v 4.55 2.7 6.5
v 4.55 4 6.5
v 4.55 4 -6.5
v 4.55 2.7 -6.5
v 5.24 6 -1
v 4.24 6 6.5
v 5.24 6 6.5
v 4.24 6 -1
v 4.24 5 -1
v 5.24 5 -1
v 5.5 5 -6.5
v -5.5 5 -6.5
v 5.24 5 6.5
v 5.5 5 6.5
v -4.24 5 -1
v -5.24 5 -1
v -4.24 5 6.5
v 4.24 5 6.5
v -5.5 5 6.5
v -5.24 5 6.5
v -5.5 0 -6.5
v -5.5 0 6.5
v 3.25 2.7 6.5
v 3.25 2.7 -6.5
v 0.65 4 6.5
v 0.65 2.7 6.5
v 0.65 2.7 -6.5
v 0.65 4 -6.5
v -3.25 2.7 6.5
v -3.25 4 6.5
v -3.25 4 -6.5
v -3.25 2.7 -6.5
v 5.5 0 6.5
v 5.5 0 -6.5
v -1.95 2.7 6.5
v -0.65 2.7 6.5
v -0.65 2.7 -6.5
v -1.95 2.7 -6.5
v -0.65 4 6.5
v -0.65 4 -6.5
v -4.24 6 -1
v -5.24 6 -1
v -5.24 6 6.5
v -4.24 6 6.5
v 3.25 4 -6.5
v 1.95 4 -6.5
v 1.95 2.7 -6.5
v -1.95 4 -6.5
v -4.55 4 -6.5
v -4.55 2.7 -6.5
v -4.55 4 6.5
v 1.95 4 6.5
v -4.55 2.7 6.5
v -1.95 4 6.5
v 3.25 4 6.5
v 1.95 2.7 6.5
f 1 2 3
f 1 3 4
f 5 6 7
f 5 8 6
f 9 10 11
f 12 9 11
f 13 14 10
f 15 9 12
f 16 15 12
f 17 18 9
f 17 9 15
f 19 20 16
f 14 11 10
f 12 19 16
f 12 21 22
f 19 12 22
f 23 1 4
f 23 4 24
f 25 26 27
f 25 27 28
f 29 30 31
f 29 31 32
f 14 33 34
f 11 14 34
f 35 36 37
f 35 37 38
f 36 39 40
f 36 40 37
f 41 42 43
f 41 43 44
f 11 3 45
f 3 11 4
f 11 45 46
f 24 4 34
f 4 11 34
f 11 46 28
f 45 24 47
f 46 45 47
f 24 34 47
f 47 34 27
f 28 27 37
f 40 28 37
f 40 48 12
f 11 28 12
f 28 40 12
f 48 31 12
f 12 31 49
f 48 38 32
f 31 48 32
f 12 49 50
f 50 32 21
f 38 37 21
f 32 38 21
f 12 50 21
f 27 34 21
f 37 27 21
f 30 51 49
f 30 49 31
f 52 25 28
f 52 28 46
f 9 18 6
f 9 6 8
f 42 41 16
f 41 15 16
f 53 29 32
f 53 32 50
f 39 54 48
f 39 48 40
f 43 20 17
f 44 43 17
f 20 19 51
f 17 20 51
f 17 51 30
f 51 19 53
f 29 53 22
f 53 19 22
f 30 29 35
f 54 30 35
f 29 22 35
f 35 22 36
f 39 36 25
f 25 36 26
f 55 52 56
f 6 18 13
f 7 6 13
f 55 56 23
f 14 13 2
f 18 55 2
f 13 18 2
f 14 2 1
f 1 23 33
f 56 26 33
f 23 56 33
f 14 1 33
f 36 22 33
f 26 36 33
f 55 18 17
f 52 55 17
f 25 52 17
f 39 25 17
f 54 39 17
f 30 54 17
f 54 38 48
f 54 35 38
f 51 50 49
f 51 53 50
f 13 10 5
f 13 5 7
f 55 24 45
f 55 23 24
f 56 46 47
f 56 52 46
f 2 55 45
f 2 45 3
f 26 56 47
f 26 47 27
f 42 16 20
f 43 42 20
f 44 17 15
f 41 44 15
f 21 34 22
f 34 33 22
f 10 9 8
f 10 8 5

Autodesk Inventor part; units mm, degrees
ref_plane "YZ Plane" through (0, 0, 0) normal (1, 0, 0) x (0, 1, 0)
ref_plane "XZ Plane" through (0, 0, 0) normal (0, 1, 0) x (-1, 0, 0)
ref_plane "XY Plane" through (0, 0, 0) normal (0, 0, 1) x (1, 0, 0)
sketch "Sketch1" plane through (0, 0, 0) normal (0, 1, 0) x (-1, 0, 0)
  line L0 (5.5, 6.5) -> (-5.5, 6.5)
  line L1 (-5.5, 6.5) -> (-5.5, -6.5)
  line L2 (-5.5, -6.5) -> (5.5, -6.5)
  line L3 (5.5, -6.5) -> (5.5, 6.5)
  line L4 (0, -9.1) -> (0, 9.1) projected
  line L5 (-7.7, 0) -> (7.7, 0) projected
  point P0 (0, 0)
  dimension "d0" = 11
  dimension "d1" = 5.5
  dimension "d2" = 13
  dimension "d3" = 6.5
extrude "Extrusion1" add sketch "Sketch1" along normal blind 5
sketch "Sketch2" plane through (0, 5, 0) normal (0, 1, 0) x (1, 0, 0)
  line L0 (-5.5, -6.5) -> (5.5, -6.5) projected
  line L1 (-5.24, -6.5) -> (-4.24, -6.5)
  line L2 (-4.24, -6.5) -> (-4.24, 1)
  line L3 (-4.24, 1) -> (-5.24, 1)
  line L4 (-5.24, 1) -> (-5.24, -6.5)
  line L5 (5.24, -6.5) -> (4.24, -6.5)
  line L6 (4.24, -6.5) -> (4.24, 1)
  line L7 (4.24, 1) -> (5.24, 1)
  line L8 (5.24, 1) -> (5.24, -6.5)
  line L9 (5.5, -6.5) -> (5.5, 6.5) projected
  line L10 (-5.5, 6.5) -> (-5.5, -6.5) projected
  point P0 (0, 0)
  point P1 (4.74, 1)
  point P2 (4.24, -6.5)
  dimension "d6" = 0.26
  dimension "d7" = 0.26
  dimension "d8" = 1
  dimension "d9" = 1
  dimension "d10" = 7.5
  dimension "d11" = 7.5
extrude "Extrusion2" add sketch "Sketch2" along normal blind 1
sketch "Sketch3" plane through (-5.5, 0, 6.5) normal (0, 0, 1) x (1, 0, 0)
  line L0 (0.95, 4) -> (2.25, 4)
  line L1 (2.25, 4) -> (2.25, 2.7)
  line L2 (2.25, 2.7) -> (0.95, 2.7)
  line L3 (0.95, 2.7) -> (0.95, 4)
  line L4 (3.55, 4) -> (4.85, 4)
  line L5 (4.85, 4) -> (4.85, 2.7)
  line L6 (4.85, 2.7) -> (3.55, 2.7)
  line L7 (3.55, 2.7) -> (3.55, 4)
  line L8 (6.15, 4) -> (7.45, 4)
  line L9 (7.45, 4) -> (7.45, 2.7)
  line L10 (7.45, 2.7) -> (6.15, 2.7)
  line L11 (6.15, 2.7) -> (6.15, 4)
  line L12 (8.75, 4) -> (10.05, 4)
  line L13 (10.05, 4) -> (10.05, 2.7)
  line L14 (10.05, 2.7) -> (8.75, 2.7)
  line L15 (8.75, 2.7) -> (8.75, 4)
  line L16 (0, 0) -> (0, 5) projected
  line L17 (5.5, 7.2) -> (5.5, -1.2) projected
  line L18 (1.26, 5) -> (9.74, 5) projected
  point P0 (5.5, 0)
  point P1 (0.95, 3.35)
  dimension "d14" = 1.3
  dimension "d15" = 1.3
  dimension "d18" = 1.3
  dimension "d19" = 1.3
  dimension "d21" = 1.3
  dimension "d22" = 1.3
  dimension "d23" = 1.3
  dimension "d24" = 0.65
  dimension "d25" = 1.3
  dimension "d26" = 1
extrude "Extrusion3" cut sketch "Sketch3" against normal up to surface (13 mm away)
equation "\"d1\" = 0.5 * d0"
equation "\"d3\" = 0.5 * d2"
equation "\"d7\" = d6"
equation "\"d9\" = d8"
equation "\"d11\" = d10"
equation "\"d15\" = d14"
equation "\"d18\" = d15"
equation "\"d19\" = d18"
equation "\"d21\" = d19"
equation "\"d22\" = d14"
equation "\"d23\" = d15"
equation "\"d24\" = 0.5 * d19"
equation "\"d25\" = d14"
properties part number "Four-Pin-Shell"
